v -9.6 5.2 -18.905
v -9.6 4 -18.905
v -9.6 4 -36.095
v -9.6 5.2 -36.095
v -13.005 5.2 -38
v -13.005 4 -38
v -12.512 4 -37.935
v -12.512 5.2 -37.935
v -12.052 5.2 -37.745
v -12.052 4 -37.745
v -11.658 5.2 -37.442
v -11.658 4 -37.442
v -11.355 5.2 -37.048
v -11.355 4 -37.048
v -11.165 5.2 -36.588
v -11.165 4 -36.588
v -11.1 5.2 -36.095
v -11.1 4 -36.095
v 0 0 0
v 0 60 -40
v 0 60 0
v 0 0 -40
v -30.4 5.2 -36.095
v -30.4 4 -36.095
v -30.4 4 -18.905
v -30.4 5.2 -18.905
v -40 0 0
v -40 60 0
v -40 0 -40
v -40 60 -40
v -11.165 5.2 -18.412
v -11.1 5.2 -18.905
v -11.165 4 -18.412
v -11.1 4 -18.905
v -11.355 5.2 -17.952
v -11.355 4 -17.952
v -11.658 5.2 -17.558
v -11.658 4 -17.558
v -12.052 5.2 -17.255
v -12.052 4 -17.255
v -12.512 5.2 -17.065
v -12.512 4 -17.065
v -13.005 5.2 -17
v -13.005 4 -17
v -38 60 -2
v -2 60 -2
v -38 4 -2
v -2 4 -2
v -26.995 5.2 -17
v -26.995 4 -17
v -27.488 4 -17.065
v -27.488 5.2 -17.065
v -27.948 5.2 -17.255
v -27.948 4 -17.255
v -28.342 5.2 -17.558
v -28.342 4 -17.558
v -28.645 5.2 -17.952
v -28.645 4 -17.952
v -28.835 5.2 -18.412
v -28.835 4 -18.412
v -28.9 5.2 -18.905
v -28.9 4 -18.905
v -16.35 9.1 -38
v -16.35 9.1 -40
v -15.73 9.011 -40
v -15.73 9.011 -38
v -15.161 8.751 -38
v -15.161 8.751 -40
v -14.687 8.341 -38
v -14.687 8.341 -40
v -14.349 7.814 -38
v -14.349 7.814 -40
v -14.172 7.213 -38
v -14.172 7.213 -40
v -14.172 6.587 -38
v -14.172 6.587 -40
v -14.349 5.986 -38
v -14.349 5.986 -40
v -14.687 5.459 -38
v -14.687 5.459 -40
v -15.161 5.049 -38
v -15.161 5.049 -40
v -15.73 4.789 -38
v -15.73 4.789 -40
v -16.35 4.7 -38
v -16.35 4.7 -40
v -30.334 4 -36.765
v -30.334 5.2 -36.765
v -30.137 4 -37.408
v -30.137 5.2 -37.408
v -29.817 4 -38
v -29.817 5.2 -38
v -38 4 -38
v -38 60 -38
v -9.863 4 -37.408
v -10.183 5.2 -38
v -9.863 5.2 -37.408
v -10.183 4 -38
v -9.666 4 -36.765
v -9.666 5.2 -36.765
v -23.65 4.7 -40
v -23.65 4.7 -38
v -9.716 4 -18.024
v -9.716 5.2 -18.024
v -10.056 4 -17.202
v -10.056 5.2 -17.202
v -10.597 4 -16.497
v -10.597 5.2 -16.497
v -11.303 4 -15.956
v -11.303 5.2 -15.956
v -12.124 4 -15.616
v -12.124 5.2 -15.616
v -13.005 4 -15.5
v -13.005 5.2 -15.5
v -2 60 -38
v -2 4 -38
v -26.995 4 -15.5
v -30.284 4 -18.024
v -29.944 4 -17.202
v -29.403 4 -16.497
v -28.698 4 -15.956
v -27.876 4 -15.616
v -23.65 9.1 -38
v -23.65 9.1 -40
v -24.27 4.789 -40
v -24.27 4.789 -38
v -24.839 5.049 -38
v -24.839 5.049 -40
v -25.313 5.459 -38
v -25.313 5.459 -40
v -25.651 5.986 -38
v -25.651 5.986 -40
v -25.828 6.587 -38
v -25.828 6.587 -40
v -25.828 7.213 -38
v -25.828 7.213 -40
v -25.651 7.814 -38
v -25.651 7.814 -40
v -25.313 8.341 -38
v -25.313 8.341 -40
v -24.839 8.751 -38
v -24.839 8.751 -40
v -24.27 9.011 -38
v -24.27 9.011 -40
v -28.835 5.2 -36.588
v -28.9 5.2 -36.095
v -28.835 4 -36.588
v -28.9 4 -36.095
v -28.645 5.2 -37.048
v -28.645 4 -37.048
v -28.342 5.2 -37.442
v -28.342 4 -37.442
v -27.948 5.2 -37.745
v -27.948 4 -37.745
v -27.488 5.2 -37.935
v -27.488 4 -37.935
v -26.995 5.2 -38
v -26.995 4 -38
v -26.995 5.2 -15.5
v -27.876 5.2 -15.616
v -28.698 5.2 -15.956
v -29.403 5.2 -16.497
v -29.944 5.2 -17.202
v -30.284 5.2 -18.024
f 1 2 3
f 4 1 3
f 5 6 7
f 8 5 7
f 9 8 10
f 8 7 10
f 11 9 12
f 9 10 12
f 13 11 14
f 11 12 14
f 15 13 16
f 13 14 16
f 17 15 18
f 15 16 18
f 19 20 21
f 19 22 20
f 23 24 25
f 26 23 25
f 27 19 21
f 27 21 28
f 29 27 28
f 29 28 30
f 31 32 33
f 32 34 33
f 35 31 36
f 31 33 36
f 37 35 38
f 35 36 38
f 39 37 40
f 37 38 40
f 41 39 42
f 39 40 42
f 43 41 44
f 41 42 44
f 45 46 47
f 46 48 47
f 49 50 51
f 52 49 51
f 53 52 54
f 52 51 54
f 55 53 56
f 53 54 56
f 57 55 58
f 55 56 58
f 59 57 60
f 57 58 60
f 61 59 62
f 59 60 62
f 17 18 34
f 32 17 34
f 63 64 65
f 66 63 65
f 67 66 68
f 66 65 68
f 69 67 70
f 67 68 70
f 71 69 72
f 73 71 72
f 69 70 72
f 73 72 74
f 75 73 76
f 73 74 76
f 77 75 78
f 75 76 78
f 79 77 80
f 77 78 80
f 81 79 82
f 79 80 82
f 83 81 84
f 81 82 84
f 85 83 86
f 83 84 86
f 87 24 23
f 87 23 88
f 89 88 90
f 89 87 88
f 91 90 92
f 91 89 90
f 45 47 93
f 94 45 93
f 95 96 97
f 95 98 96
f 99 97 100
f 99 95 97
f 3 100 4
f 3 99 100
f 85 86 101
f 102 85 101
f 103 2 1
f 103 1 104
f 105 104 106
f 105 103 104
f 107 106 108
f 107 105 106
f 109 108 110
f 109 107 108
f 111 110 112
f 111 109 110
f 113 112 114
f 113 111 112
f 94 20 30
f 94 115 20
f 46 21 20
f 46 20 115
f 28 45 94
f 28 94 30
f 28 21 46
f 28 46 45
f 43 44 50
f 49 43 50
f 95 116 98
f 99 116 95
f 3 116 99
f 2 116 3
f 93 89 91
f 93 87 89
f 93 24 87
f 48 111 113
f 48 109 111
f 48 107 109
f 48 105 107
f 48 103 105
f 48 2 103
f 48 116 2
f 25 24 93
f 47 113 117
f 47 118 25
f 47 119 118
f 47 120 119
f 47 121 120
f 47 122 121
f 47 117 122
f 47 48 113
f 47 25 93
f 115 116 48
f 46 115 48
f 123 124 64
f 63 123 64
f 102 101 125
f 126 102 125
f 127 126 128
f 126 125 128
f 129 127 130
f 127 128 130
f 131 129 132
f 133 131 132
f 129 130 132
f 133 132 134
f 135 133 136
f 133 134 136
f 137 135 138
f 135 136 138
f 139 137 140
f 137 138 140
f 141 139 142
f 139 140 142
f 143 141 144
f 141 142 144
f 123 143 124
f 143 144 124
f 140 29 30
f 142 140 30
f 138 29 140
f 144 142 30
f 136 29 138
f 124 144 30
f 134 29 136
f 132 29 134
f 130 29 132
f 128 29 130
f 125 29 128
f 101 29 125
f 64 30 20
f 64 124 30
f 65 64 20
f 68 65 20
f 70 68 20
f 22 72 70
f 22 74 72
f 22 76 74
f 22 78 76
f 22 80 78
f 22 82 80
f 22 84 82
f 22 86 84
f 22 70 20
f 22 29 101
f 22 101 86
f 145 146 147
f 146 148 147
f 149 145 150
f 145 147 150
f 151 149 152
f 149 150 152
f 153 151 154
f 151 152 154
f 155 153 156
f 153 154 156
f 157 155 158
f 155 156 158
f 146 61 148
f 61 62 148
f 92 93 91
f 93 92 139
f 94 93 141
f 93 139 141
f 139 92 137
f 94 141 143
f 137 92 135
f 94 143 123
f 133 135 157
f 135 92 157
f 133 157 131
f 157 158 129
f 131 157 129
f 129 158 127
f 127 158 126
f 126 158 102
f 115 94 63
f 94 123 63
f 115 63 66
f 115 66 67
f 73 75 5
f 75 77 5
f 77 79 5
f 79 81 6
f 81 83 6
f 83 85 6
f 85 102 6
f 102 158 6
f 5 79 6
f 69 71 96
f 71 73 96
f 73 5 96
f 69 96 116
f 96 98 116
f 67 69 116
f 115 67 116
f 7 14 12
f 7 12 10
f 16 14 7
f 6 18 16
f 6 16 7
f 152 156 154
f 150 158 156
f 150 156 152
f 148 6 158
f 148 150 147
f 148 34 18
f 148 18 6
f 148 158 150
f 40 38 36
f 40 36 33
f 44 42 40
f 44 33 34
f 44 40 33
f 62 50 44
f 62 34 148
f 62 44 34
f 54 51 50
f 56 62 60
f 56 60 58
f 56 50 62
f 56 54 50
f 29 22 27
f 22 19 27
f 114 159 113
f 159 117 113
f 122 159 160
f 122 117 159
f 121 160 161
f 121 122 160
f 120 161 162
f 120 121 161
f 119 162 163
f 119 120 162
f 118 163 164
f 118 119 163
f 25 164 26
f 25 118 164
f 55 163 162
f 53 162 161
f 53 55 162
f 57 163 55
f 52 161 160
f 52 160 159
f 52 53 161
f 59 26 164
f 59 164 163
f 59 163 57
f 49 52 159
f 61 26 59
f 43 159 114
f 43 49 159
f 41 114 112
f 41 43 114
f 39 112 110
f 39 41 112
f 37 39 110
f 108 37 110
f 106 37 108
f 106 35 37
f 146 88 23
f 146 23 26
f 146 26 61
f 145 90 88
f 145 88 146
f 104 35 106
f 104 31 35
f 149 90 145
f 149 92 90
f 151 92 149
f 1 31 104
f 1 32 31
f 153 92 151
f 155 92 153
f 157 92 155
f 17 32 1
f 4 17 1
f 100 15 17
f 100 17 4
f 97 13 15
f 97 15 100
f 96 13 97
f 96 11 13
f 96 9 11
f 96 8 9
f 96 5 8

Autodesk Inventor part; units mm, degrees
ref_plane "YZ Plane" through (0, 0, 0) normal (1, 0, 0) x (0, 1, 0)
ref_plane "XZ Plane" through (0, 0, 0) normal (0, 1, 0) x (-1, 0, 0)
ref_plane "XY Plane" through (0, 0, 0) normal (0, 0, 1) x (1, 0, 0)
sketch "Sketch1" plane through (0, 0, 0) normal (0, 1, 0) x (-1, 0, 0)
  line L0 (0, 0) -> (40, 0)
  line L1 (40, 0) -> (40, -40)
  line L2 (40, -40) -> (0, -40)
  line L3 (0, -40) -> (0, 0)
  line L4 (2, -2) -> (38, -2)
  line L5 (38, -2) -> (38, -38)
  line L6 (38, -38) -> (2, -38)
  line L7 (2, -38) -> (2, -2)
  dimension "d0" = 40
  dimension "d1" = 40
  dimension "d2" = 2
  dimension "d3" = 2
  dimension "d4" = 2
  dimension "d5" = 2
extrude "Extrusion1" add sketch "Sketch1" along normal blind 4 contours L4 L5 L6 L7
extrude "Extrusion2" add sketch "Sketch1" along normal blind 60
sketch "Sketch2" plane through (0, 4, 0) normal (0, 1, 0) x (1, 0, 0)
  line L0 (-26.995, 38) -> (-13.005, 38)
  line L1 (-11.1, 36.095) -> (-11.1, 18.905)
  line L2 (-13.005, 17) -> (-26.995, 17)
  line L3 (-28.9, 18.905) -> (-28.9, 36.095)
  arc A0 (-26.995, 38) -> (-28.9, 36.095) centre (-26.995, 36.095) ccw
  arc A1 (-11.1, 36.095) -> (-13.005, 38) centre (-13.005, 36.095) ccw
  arc A2 (-28.9, 18.905) -> (-26.995, 17) centre (-26.995, 18.905) ccw
  arc A3 (-13.005, 17) -> (-11.1, 18.905) centre (-13.005, 18.905) ccw
  line L4 (-38, 38) -> (-2, 38) projected
  line L5 (-38, 2) -> (-38, 38) projected
  line L6 (-30.4, 36.095) -> (-30.4, 18.905)
  arc A4 (-30.4, 18.905) -> (-26.995, 15.5) centre (-26.995, 18.905) ccw
  line L7 (-26.995, 15.5) -> (-13.005, 15.5)
  arc A5 (-13.005, 15.5) -> (-9.6, 18.905) centre (-13.005, 18.905) ccw
  line L8 (-9.6, 18.905) -> (-9.6, 36.095)
  arc A6 (-9.6, 36.095) -> (-10.1828, 38) centre (-13.005, 36.095) ccw
  arc A7 (-29.8172, 38) -> (-30.4, 36.095) centre (-26.995, 36.095) ccw
  line L9 (-29.8172, 38) -> (-10.1828, 38)
  line L10 (-40, 40) -> (-40, 0) projected
  point P0 (0, 0)
  point P1 (-11.1, 17)
  point P2 (-11.1, 38)
  point P3 (-28.9, 17)
  point P4 (-20, 38)
  point P5 (-13.005, 38)
  point P6 (-20, 17)
  dimension "d11" = 17.8
  dimension "d12" = 21
  dimension "d13" = 1.905
  dimension "d14" = 0
  dimension "d16" = 1.5
  dimension "d25" = 20
extrude "Extrusion3" add sketch "Sketch2" along normal blind 1.2 contours A0 L3 A2 L2 A3 L1 A1 L4 A6 L8 A5 L7 A4 L6 A7
sketch "Sketch3" plane through (-38, 60, -38) normal (0, 0, 1) x (1, 0, 0)
  point P0 (38, -60)
sketch "Sketch4" plane through (0, 0, -40) normal (0, 0, -1) x (-1, 0, 0)
  line L0 (16.35, 6.9) -> (23.65, 6.9) construction
  line L1 (16.35, 4.7) -> (23.65, 4.7)
  line L2 (23.65, 9.1) -> (16.35, 9.1)
  arc A0 (16.35, 9.1) -> (16.35, 4.7) centre (16.35, 6.9) ccw
  arc A1 (23.65, 4.7) -> (23.65, 9.1) centre (23.65, 6.9) ccw
  line L3 (0, 0) -> (40, 0) projected
  line L4 (0, 0) -> (0, 60) projected
  point P0 (20, 6.9)
  dimension "d19" = 7.3
  dimension "d20" = 4.4
  dimension "d21" = 4.7
  dimension "d22" = 20
extrude "Extrusion4" cut sketch "Sketch4" against normal blind 2
properties part number "sensor_block" material "Brass, Soft Yellow, Welded"
